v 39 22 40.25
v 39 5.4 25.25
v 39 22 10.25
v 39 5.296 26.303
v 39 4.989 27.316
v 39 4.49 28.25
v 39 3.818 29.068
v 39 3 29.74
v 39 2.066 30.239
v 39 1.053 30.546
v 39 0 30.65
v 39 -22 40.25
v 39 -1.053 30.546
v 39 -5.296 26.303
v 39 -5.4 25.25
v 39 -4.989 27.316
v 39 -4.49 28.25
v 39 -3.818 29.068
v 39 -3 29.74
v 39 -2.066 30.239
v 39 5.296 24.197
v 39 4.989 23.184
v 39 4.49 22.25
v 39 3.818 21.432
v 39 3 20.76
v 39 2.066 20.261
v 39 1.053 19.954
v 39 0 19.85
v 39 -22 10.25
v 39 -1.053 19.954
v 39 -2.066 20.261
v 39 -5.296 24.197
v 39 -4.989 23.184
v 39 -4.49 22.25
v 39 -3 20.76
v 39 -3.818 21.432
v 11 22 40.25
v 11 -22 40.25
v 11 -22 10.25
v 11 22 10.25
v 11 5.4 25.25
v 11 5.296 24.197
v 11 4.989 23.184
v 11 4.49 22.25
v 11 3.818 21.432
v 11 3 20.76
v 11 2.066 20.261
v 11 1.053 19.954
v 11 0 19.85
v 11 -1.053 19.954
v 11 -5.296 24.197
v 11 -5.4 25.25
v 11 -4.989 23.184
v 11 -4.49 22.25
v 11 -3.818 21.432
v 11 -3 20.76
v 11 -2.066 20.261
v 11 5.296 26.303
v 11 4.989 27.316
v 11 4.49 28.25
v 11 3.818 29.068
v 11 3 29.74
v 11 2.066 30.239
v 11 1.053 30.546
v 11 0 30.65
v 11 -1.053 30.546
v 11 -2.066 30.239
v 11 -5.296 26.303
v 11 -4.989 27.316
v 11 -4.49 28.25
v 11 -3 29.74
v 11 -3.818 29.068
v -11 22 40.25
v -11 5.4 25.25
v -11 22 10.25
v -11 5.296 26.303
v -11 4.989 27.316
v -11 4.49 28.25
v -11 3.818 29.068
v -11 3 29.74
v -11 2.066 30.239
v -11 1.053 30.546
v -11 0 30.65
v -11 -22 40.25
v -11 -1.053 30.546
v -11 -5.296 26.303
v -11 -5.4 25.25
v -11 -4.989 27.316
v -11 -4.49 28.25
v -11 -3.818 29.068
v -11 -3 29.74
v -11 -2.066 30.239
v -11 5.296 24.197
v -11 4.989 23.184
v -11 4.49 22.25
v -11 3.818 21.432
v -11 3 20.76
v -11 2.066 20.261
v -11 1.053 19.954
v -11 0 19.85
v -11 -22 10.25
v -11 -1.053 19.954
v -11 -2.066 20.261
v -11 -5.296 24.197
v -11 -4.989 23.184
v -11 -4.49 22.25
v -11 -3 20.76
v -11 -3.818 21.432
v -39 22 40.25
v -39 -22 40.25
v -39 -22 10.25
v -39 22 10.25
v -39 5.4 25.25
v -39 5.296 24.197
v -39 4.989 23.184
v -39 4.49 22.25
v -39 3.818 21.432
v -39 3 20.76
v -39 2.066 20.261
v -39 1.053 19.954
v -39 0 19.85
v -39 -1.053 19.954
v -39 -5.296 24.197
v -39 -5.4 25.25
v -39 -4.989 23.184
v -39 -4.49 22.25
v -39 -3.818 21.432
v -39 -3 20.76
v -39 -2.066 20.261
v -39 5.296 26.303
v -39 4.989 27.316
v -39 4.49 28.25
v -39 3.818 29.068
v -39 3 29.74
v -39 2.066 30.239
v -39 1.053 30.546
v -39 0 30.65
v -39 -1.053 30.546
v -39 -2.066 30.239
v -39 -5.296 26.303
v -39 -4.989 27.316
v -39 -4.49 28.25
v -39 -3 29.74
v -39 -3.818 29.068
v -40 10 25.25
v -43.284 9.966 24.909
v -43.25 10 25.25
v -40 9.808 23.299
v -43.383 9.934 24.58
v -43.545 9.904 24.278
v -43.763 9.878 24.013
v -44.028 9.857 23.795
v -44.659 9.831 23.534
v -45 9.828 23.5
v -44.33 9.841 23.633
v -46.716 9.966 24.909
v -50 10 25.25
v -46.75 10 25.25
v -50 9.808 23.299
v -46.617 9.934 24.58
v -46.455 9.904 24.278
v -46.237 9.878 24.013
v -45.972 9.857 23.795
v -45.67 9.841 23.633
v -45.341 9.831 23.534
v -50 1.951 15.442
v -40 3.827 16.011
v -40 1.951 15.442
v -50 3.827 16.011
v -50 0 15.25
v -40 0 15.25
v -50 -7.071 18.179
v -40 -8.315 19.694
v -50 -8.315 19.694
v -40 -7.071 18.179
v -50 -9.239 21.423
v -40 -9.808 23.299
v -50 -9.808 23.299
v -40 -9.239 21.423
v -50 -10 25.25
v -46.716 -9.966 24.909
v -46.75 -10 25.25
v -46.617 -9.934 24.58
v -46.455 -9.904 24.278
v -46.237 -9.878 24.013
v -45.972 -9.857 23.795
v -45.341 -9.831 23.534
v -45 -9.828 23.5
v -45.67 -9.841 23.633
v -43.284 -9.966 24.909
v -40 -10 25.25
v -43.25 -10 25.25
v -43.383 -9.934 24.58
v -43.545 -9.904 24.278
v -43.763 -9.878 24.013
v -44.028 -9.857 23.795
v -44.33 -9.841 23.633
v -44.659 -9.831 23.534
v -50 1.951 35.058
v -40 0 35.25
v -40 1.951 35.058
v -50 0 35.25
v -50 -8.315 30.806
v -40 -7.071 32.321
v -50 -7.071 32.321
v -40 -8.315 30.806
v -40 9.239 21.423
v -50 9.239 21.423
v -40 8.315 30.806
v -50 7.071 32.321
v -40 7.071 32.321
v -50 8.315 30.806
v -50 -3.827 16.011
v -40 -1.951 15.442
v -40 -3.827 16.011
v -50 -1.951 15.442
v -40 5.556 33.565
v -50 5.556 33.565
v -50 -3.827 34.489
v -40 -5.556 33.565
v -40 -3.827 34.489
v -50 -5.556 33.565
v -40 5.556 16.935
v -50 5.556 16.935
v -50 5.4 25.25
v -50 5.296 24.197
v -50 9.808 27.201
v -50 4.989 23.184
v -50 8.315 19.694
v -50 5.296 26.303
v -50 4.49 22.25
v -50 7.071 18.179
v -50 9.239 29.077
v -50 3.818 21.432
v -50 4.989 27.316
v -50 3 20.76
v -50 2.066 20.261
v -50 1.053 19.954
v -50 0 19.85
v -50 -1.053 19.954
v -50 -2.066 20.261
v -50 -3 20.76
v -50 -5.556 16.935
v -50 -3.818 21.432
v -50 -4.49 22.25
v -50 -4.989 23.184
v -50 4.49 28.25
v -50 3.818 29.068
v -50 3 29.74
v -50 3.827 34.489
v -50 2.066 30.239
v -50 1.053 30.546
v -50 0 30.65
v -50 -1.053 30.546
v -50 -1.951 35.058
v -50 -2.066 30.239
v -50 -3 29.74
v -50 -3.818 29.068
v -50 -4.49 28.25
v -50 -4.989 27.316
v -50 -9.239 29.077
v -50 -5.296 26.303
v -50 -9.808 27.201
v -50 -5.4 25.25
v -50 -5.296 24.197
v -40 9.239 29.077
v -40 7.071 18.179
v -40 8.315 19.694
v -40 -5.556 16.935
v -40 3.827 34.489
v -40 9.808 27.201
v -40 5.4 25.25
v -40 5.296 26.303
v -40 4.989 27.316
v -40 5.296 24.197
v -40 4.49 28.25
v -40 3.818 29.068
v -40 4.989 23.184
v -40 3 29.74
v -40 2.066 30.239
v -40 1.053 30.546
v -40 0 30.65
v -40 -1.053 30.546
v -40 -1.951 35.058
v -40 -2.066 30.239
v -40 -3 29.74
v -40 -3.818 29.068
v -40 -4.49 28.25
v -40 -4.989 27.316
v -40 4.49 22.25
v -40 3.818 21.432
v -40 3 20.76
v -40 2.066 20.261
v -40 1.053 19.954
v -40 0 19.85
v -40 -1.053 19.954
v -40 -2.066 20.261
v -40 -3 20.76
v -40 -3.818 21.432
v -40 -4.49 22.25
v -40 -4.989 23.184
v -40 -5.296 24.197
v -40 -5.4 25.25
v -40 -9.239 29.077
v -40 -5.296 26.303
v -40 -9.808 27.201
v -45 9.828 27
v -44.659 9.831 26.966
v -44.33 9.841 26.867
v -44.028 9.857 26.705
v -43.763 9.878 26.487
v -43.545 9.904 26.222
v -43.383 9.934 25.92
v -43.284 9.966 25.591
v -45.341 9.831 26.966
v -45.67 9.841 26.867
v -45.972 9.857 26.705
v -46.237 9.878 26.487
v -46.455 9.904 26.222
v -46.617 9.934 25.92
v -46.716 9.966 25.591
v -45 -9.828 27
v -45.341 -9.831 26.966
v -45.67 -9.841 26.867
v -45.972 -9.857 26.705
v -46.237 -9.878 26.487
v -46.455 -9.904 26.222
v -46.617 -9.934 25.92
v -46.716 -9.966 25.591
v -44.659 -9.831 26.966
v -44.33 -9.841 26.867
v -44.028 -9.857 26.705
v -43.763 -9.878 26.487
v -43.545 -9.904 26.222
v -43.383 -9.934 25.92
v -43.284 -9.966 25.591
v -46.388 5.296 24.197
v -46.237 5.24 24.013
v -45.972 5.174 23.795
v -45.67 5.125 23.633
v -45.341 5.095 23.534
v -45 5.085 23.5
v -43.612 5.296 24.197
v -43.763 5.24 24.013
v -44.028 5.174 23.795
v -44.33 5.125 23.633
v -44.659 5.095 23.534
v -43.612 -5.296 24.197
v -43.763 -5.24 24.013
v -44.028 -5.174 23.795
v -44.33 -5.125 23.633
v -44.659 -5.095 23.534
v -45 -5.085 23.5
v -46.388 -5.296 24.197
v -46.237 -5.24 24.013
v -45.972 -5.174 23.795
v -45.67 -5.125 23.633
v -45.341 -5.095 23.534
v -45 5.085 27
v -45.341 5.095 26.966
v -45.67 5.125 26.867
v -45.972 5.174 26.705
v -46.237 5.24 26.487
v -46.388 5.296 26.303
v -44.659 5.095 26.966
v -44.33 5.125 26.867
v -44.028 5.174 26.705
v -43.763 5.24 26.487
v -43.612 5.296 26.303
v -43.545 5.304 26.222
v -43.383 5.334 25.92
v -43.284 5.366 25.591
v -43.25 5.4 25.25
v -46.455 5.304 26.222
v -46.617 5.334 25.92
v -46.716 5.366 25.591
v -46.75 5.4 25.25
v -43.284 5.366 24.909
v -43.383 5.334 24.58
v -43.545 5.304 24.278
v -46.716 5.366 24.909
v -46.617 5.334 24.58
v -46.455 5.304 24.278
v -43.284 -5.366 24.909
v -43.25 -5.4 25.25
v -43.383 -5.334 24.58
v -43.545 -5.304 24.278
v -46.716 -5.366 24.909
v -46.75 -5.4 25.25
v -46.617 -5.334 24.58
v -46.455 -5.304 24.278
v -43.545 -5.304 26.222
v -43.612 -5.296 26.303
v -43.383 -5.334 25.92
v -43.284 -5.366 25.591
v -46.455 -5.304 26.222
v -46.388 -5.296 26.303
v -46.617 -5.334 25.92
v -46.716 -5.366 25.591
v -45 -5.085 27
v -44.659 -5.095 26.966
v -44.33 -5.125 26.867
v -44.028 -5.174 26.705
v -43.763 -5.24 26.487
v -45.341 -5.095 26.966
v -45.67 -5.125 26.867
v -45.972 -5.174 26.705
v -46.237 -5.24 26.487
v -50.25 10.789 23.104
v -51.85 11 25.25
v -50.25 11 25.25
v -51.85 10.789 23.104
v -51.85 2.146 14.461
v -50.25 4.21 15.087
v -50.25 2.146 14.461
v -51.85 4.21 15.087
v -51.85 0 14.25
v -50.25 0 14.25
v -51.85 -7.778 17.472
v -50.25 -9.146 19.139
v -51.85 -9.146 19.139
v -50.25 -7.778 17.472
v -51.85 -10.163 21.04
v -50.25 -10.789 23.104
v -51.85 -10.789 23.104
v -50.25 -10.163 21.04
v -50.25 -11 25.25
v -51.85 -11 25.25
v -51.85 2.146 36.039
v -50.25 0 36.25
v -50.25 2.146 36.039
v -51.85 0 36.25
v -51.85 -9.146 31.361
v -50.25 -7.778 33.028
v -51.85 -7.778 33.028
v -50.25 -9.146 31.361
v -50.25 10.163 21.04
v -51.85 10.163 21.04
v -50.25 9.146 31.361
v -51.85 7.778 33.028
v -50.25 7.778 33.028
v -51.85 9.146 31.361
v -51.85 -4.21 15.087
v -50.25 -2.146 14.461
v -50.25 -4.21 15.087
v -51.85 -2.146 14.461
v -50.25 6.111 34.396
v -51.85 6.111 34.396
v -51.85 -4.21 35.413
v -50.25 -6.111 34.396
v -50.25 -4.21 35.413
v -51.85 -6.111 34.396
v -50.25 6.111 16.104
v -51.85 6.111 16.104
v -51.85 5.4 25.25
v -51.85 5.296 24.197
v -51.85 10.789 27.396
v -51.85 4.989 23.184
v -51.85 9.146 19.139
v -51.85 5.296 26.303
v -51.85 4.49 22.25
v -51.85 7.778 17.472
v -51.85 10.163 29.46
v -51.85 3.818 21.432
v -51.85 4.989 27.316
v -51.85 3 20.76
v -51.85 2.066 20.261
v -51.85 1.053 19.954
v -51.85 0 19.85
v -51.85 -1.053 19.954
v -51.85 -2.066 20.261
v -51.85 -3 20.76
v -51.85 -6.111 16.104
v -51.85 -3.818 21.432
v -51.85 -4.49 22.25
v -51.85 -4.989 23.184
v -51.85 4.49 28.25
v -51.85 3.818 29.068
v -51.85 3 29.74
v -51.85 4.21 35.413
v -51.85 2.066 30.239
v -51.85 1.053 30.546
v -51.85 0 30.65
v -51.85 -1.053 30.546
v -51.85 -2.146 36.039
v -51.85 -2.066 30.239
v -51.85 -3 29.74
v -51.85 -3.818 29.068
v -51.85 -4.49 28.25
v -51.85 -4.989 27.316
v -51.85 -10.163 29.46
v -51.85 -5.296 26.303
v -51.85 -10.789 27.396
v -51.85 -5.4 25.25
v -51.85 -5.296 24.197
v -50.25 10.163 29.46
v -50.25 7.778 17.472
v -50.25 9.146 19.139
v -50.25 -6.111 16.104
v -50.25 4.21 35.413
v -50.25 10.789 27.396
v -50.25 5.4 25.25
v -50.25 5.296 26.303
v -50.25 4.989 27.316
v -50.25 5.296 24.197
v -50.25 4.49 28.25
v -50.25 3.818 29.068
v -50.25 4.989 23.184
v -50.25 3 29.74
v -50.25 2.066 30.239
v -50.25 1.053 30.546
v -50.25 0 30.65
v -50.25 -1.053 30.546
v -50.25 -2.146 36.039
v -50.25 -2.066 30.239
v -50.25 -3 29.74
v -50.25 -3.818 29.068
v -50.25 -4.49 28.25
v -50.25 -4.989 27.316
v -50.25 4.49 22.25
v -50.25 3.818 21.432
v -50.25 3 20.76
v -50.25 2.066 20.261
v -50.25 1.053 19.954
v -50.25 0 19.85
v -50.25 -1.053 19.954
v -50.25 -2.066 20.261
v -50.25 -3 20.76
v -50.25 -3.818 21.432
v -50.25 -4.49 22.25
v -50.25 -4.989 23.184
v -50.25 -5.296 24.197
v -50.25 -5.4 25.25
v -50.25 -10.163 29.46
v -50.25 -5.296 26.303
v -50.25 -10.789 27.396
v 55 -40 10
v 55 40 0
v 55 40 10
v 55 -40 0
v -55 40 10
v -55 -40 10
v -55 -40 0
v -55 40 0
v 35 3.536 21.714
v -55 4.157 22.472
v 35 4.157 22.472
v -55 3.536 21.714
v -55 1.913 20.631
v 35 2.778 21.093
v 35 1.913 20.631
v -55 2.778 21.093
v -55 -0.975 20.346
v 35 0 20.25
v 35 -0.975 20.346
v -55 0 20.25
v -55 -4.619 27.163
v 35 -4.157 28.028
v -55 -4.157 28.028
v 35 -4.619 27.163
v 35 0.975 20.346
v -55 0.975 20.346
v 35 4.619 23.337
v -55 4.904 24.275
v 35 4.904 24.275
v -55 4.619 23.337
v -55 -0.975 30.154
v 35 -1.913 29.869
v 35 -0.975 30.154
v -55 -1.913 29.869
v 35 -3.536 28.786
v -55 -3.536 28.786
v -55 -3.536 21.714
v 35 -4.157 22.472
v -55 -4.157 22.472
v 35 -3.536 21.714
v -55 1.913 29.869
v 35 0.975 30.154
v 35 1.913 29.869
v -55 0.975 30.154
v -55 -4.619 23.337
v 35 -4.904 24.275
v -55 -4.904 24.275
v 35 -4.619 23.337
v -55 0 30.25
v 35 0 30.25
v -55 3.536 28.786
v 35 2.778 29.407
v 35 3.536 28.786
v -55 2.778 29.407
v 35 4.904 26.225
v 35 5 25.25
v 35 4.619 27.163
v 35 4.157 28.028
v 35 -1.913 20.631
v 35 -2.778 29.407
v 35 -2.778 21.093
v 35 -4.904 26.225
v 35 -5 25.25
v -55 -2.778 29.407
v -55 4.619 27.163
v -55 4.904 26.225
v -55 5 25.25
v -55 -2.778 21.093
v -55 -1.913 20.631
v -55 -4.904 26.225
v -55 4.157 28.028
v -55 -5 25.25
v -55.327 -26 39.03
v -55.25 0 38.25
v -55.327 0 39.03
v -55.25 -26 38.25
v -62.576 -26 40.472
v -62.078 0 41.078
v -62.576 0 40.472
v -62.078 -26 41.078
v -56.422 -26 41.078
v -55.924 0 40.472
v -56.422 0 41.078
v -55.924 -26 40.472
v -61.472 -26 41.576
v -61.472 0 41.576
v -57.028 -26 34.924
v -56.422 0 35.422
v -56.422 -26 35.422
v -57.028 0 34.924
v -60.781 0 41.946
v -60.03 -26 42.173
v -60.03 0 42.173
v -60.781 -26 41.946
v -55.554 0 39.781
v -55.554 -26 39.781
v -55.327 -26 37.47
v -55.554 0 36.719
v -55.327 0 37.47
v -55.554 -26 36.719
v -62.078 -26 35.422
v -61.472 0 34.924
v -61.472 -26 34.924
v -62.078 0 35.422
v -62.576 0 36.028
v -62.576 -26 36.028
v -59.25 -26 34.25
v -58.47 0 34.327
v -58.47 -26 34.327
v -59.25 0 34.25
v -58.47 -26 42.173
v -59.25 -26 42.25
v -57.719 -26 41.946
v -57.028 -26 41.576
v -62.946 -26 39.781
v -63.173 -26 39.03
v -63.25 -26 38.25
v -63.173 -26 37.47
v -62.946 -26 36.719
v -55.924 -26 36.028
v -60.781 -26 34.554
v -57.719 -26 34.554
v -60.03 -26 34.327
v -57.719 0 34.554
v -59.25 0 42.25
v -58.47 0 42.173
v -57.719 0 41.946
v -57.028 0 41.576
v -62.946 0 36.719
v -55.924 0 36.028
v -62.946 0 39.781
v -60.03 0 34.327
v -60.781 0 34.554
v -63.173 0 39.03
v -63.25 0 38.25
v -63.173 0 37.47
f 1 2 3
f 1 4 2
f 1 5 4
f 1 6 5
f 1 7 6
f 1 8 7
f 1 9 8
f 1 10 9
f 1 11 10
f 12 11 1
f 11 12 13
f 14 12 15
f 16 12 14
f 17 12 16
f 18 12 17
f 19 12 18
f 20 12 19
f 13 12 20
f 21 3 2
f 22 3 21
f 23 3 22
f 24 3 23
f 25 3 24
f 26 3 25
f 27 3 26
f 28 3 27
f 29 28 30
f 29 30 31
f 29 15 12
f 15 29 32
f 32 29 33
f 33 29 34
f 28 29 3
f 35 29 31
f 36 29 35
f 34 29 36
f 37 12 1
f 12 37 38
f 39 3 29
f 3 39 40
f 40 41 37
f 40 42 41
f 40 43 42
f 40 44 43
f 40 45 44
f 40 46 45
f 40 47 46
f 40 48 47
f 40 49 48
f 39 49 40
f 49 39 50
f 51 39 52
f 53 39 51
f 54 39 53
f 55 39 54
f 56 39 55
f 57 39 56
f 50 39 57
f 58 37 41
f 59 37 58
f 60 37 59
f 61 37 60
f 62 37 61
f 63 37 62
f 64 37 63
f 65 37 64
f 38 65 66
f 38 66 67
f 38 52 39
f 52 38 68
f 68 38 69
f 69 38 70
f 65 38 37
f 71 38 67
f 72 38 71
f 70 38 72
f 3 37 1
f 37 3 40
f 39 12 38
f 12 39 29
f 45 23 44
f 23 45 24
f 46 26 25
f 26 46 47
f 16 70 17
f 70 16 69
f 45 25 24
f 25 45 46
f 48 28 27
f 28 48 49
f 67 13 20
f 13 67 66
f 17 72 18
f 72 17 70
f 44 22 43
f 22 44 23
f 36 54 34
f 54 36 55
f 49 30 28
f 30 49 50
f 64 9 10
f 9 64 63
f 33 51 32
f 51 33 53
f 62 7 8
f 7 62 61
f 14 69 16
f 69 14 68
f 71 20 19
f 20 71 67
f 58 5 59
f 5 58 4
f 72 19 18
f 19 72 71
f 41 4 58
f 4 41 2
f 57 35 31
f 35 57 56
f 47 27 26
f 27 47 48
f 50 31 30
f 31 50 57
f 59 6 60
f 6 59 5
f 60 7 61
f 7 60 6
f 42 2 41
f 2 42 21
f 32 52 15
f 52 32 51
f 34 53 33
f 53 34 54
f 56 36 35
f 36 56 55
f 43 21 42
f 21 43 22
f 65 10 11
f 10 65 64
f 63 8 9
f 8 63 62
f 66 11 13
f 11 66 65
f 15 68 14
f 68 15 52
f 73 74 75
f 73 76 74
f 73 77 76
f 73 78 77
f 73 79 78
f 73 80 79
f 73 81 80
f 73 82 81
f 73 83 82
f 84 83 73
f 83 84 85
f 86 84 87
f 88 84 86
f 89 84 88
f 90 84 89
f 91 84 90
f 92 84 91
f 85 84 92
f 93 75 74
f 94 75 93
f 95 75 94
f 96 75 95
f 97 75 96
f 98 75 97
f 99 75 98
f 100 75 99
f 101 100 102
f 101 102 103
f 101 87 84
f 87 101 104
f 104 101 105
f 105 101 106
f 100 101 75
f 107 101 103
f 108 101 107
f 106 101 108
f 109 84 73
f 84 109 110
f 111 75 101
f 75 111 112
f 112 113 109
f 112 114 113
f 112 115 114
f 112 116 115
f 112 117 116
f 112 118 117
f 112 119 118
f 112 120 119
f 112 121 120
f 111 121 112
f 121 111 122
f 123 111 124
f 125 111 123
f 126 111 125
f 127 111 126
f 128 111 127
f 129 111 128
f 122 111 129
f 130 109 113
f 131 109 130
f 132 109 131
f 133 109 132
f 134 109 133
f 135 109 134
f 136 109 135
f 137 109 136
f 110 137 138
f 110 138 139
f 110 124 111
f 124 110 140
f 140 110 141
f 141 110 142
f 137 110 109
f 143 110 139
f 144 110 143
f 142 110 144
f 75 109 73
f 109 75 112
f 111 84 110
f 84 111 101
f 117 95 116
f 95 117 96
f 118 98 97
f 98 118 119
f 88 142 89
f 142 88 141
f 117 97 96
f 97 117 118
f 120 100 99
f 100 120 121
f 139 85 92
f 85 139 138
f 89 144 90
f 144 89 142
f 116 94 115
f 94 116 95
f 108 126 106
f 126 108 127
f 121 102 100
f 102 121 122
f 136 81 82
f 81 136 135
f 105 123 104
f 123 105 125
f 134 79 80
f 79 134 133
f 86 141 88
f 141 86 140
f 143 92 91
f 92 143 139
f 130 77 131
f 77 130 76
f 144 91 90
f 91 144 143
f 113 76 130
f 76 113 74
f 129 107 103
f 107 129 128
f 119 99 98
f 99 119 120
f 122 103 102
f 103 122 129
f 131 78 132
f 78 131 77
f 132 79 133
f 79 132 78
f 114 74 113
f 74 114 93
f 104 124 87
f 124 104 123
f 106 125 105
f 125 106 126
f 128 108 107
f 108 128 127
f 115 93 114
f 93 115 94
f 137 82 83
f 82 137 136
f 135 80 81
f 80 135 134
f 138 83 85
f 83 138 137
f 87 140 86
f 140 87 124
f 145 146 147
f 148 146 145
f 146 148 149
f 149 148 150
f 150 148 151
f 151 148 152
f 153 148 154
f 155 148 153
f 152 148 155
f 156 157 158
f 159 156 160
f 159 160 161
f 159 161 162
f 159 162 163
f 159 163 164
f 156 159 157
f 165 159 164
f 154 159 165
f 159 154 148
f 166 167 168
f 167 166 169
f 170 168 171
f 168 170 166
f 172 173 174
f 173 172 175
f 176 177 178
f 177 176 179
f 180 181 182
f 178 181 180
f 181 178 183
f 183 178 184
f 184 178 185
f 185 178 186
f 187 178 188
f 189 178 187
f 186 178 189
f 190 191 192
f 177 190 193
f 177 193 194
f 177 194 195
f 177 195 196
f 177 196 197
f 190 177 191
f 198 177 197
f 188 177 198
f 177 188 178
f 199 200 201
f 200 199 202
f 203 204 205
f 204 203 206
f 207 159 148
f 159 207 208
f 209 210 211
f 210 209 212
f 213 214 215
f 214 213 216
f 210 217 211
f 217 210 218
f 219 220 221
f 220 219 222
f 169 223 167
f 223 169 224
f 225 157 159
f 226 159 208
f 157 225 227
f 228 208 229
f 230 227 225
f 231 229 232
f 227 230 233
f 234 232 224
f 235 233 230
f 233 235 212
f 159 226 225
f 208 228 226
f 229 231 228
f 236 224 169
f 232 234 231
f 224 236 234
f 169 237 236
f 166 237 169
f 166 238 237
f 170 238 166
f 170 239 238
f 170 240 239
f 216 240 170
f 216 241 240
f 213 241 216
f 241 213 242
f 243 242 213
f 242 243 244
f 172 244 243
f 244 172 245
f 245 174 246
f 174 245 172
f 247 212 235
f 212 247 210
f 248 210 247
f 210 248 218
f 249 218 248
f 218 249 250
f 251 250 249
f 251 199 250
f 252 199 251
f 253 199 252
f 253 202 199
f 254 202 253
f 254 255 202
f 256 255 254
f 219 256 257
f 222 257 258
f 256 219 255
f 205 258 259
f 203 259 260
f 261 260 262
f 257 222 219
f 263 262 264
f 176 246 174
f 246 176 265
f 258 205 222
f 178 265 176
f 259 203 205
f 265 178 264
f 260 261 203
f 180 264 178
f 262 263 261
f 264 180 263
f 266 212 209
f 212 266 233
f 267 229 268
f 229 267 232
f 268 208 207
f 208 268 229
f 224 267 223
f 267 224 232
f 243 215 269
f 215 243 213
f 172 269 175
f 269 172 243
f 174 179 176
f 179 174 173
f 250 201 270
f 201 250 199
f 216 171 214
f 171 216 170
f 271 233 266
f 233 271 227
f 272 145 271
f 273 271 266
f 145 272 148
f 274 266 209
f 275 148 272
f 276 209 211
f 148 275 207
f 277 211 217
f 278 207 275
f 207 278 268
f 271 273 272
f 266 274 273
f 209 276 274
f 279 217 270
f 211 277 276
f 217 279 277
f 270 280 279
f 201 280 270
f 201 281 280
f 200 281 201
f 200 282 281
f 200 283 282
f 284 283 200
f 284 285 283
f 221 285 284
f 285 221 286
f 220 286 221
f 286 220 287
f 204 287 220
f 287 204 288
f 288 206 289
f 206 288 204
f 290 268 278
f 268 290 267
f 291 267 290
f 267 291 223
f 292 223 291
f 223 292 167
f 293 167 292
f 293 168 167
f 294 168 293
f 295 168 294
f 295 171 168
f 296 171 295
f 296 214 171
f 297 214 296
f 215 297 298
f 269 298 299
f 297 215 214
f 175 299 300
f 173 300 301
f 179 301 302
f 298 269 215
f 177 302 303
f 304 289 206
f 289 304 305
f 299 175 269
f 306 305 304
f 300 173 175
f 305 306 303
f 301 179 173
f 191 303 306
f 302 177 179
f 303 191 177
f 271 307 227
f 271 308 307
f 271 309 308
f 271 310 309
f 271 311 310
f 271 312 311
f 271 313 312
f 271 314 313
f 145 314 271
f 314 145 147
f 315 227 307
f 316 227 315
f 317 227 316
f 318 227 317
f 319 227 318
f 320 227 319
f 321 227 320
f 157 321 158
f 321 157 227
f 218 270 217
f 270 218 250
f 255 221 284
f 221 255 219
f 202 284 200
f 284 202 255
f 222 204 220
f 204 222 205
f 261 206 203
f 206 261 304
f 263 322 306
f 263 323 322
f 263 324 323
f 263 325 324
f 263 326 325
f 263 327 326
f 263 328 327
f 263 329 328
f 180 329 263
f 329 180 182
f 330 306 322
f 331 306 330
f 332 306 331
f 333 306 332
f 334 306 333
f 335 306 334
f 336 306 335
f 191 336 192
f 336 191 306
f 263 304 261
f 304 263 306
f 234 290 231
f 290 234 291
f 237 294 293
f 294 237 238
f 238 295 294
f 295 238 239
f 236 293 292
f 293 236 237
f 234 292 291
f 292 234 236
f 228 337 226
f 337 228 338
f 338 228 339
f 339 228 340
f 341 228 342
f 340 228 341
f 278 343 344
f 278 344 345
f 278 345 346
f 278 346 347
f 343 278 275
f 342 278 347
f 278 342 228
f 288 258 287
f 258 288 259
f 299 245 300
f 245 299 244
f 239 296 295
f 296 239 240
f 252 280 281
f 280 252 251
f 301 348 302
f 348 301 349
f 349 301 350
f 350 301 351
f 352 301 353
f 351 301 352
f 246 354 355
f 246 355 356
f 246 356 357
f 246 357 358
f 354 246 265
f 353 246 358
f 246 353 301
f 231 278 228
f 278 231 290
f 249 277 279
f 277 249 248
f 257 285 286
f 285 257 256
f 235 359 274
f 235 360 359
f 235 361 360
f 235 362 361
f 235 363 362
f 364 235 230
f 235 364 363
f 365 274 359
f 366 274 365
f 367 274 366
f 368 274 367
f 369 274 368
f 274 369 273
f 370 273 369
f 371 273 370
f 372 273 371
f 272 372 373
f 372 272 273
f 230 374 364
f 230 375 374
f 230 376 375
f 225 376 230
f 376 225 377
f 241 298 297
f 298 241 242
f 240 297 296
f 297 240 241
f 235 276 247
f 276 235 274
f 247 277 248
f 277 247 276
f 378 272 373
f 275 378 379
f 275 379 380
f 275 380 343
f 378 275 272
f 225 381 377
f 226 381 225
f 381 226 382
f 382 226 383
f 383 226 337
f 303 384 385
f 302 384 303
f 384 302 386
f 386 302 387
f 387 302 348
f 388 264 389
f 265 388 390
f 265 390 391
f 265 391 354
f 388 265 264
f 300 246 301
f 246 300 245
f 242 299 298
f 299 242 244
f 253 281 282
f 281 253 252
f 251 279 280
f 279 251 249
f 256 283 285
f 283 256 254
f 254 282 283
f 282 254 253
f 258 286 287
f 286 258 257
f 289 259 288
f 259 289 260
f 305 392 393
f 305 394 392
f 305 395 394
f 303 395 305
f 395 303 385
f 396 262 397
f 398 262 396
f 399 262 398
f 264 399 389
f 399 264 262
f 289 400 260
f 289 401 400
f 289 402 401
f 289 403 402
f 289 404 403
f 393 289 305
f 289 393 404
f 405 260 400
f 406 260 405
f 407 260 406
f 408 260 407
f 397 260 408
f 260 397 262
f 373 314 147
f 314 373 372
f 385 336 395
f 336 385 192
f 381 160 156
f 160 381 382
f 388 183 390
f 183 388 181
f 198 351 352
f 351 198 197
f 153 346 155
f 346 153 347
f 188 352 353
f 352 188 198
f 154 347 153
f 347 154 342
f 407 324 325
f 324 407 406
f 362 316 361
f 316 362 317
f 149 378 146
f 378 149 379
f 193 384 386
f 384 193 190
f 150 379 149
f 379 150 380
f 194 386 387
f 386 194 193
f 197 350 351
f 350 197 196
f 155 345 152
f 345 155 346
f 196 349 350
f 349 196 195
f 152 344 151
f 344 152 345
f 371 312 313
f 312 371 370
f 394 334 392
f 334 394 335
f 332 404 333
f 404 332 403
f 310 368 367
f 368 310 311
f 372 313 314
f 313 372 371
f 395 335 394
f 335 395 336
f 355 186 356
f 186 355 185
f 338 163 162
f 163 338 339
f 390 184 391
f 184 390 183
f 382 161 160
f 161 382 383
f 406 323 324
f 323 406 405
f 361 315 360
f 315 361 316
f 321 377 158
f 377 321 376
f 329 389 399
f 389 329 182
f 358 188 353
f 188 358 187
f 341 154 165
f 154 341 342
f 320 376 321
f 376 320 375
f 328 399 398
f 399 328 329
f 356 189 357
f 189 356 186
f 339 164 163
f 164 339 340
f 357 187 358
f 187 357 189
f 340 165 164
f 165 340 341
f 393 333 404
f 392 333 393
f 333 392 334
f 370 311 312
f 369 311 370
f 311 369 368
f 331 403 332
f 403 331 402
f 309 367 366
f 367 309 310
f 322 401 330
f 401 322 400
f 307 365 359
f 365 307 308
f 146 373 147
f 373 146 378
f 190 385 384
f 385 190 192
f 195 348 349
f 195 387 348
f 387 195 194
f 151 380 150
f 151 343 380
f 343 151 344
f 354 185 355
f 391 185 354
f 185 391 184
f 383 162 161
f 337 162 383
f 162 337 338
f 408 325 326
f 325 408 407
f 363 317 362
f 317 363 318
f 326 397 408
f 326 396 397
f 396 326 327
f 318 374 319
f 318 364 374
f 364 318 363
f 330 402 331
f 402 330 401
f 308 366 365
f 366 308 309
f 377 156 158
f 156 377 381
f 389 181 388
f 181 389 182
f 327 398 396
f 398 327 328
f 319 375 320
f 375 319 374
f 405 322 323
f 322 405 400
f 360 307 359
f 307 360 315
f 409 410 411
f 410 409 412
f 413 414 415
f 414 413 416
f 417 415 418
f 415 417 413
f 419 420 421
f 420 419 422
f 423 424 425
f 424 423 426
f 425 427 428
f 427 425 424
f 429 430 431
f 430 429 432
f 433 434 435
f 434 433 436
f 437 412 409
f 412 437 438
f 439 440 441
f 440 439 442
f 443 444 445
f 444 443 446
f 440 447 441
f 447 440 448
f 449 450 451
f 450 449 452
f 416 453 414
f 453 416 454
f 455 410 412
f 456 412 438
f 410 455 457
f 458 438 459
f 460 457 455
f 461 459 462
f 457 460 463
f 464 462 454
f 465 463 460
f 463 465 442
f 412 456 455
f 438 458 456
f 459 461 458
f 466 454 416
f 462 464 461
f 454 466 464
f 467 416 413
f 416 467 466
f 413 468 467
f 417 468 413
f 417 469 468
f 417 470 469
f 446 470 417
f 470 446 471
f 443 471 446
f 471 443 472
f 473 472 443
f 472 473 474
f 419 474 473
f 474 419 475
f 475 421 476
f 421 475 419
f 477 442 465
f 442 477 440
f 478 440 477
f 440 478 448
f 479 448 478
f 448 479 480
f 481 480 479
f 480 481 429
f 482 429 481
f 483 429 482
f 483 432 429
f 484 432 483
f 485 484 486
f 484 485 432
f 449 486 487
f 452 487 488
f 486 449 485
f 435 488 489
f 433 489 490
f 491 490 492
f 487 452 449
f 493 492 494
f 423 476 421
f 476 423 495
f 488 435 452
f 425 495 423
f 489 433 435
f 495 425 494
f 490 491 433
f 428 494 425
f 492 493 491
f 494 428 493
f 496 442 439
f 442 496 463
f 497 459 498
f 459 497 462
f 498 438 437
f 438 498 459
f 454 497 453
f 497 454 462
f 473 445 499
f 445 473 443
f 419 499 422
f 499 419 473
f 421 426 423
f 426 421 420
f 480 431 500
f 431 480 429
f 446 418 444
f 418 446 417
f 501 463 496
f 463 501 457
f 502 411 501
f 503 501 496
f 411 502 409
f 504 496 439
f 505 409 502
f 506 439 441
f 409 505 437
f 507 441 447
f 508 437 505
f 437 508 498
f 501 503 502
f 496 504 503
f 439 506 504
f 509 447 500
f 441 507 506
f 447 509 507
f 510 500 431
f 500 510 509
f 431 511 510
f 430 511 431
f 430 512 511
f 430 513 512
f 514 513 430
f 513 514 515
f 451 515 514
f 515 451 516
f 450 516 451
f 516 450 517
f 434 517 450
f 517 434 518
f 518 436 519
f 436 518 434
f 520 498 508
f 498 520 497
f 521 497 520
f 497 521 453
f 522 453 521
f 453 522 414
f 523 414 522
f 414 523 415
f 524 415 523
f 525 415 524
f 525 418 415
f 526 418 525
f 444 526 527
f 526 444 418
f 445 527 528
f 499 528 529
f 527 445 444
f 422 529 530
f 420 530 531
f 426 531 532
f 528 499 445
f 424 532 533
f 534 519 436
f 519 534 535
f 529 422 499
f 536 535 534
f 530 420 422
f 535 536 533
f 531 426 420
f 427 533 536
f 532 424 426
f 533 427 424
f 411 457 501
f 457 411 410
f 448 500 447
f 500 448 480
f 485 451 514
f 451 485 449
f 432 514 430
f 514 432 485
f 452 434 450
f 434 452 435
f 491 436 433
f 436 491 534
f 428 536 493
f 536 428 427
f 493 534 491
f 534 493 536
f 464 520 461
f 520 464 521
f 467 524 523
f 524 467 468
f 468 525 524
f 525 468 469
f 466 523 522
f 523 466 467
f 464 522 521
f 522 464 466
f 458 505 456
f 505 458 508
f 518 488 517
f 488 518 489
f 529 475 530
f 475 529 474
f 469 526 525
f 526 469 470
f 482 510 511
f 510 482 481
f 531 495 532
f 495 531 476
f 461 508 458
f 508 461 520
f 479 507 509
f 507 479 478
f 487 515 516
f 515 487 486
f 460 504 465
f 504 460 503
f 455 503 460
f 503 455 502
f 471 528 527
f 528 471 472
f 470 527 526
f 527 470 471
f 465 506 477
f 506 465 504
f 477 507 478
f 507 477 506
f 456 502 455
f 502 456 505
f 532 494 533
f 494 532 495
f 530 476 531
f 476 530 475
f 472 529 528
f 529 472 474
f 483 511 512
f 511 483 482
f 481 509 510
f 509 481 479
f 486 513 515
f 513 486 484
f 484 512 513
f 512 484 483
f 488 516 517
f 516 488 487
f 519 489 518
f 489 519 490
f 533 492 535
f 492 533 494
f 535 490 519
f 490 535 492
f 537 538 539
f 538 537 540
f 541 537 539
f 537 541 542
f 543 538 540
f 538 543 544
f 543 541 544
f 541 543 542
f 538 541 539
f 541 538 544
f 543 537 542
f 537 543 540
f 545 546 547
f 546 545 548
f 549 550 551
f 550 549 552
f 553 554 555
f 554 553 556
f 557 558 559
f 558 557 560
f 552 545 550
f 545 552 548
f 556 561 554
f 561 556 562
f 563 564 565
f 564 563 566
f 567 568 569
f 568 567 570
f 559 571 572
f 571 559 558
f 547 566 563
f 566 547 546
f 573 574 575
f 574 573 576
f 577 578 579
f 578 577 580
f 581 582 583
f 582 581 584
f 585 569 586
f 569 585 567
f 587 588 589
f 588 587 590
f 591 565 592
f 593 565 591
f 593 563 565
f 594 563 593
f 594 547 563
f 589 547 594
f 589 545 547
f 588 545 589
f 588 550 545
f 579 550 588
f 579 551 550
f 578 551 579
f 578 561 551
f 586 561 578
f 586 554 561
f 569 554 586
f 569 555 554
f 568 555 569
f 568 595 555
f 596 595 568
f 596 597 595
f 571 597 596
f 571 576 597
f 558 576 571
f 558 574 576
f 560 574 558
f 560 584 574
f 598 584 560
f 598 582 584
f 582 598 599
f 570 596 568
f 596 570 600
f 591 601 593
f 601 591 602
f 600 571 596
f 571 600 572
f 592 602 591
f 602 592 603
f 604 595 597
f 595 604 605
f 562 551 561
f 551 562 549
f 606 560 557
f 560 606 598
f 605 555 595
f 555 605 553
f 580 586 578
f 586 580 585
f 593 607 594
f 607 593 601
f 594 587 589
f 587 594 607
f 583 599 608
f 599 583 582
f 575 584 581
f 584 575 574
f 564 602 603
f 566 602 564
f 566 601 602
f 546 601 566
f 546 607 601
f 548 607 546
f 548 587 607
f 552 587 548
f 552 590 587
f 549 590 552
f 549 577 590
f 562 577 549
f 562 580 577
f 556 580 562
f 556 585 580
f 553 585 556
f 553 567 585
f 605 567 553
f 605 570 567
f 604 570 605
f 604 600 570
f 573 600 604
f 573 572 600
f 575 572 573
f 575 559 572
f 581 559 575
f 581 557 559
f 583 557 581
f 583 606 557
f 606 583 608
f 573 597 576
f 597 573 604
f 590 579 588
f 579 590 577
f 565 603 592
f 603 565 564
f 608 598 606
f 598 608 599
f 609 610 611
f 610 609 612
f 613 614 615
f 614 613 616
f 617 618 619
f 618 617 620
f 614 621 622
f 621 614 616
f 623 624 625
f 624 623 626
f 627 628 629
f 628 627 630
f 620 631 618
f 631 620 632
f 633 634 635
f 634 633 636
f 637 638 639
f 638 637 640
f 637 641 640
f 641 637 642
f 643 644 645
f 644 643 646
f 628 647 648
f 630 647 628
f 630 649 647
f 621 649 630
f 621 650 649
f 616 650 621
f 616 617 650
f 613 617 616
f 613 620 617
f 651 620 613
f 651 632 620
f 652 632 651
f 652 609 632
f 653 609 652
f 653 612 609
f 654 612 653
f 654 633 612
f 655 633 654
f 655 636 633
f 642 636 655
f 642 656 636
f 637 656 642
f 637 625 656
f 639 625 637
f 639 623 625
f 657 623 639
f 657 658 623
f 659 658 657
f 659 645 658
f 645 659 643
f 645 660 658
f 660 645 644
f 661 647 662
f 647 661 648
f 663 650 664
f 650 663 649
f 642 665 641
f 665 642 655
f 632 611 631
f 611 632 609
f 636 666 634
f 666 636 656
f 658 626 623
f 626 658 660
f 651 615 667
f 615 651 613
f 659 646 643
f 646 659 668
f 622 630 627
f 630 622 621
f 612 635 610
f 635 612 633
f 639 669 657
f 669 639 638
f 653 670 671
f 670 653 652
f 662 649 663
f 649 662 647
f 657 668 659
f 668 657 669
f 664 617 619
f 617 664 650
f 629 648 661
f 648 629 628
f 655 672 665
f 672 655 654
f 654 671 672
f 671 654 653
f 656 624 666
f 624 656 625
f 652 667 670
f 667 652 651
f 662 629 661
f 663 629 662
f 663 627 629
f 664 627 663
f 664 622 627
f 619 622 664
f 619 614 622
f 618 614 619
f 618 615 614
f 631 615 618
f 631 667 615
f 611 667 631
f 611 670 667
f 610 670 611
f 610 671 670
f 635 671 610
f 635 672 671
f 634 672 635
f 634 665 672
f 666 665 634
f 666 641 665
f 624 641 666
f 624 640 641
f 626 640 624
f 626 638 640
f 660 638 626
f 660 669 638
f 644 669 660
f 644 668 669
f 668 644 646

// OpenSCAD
$fn = 32;

// ------------------------------------------------------------------------
// Machine vise: screw d10, jaws 28 x 30 mm
// Every part is its own module, assembly() places every instance.
// ------------------------------------------------------------------------

// --- part 1 ---
module vise_bed() {
  difference() {
    translate([-55, -40, 0]) cube([110, 80, 10]);
  }
}

// --- part 2 ---
module vise_jaw() {
  difference() {
    translate([-14, -22, 0]) cube([28, 44, 30]);
    translate([0, 0, 15]) rotate([0, 90, 0]) cylinder(h = 30, d = 10.8, center = true);
  }
}

// --- part 3 ---
module vise_screw() {
  translate([0, 0, -45]) cylinder(h = 90, d = 10);
}

// --- part 4 ---
module screw_collar() {
  difference() {
    cylinder(h = 10, d = 20);
    translate([0, 0, -1]) cylinder(h = 12, d = 10.8);
    translate([0, 0, 5]) rotate([90, 0, 0]) cylinder(h = 22, d = 3.5, center = true);
  }
}

// --- part 5 ---
module screw_washer() {
  difference() {
      translate([0, 0, 0]) cylinder(h = 1.6, d = 22);
      translate([0, 0, -1]) cylinder(h = 3.6, d = 10.8);
    }
}

// --- part 6 ---
module vise_handle() {
  cylinder(h = 26, d = 8);
}

// --- assembly ---
module assembly() {
  color([0.80, 0.24, 0.20]) translate([0, 0, 0]) rotate([0, 0, 0]) vise_bed();
  color([0.20, 0.45, 0.75]) translate([25, 0, 10.25]) rotate([0, 0, 0]) vise_jaw();
  color([0.25, 0.62, 0.32]) translate([-25, 0, 10.25]) rotate([0, 0, 0]) vise_jaw();
  color([0.92, 0.70, 0.18]) translate([-10, 0, 25.25]) rotate([0, 90, 0]) vise_screw();
  color([0.58, 0.35, 0.70]) translate([-50, 0, 25.25]) rotate([0, 90, 0]) screw_collar();
  color([0.16, 0.66, 0.66]) translate([-51.85, 0, 25.25]) rotate([0, 90, 0]) screw_washer();
  color([0.85, 0.48, 0.18]) translate([-59.25, 0, 38.25]) rotate([90, 0, 0]) vise_handle();
}

assembly();
